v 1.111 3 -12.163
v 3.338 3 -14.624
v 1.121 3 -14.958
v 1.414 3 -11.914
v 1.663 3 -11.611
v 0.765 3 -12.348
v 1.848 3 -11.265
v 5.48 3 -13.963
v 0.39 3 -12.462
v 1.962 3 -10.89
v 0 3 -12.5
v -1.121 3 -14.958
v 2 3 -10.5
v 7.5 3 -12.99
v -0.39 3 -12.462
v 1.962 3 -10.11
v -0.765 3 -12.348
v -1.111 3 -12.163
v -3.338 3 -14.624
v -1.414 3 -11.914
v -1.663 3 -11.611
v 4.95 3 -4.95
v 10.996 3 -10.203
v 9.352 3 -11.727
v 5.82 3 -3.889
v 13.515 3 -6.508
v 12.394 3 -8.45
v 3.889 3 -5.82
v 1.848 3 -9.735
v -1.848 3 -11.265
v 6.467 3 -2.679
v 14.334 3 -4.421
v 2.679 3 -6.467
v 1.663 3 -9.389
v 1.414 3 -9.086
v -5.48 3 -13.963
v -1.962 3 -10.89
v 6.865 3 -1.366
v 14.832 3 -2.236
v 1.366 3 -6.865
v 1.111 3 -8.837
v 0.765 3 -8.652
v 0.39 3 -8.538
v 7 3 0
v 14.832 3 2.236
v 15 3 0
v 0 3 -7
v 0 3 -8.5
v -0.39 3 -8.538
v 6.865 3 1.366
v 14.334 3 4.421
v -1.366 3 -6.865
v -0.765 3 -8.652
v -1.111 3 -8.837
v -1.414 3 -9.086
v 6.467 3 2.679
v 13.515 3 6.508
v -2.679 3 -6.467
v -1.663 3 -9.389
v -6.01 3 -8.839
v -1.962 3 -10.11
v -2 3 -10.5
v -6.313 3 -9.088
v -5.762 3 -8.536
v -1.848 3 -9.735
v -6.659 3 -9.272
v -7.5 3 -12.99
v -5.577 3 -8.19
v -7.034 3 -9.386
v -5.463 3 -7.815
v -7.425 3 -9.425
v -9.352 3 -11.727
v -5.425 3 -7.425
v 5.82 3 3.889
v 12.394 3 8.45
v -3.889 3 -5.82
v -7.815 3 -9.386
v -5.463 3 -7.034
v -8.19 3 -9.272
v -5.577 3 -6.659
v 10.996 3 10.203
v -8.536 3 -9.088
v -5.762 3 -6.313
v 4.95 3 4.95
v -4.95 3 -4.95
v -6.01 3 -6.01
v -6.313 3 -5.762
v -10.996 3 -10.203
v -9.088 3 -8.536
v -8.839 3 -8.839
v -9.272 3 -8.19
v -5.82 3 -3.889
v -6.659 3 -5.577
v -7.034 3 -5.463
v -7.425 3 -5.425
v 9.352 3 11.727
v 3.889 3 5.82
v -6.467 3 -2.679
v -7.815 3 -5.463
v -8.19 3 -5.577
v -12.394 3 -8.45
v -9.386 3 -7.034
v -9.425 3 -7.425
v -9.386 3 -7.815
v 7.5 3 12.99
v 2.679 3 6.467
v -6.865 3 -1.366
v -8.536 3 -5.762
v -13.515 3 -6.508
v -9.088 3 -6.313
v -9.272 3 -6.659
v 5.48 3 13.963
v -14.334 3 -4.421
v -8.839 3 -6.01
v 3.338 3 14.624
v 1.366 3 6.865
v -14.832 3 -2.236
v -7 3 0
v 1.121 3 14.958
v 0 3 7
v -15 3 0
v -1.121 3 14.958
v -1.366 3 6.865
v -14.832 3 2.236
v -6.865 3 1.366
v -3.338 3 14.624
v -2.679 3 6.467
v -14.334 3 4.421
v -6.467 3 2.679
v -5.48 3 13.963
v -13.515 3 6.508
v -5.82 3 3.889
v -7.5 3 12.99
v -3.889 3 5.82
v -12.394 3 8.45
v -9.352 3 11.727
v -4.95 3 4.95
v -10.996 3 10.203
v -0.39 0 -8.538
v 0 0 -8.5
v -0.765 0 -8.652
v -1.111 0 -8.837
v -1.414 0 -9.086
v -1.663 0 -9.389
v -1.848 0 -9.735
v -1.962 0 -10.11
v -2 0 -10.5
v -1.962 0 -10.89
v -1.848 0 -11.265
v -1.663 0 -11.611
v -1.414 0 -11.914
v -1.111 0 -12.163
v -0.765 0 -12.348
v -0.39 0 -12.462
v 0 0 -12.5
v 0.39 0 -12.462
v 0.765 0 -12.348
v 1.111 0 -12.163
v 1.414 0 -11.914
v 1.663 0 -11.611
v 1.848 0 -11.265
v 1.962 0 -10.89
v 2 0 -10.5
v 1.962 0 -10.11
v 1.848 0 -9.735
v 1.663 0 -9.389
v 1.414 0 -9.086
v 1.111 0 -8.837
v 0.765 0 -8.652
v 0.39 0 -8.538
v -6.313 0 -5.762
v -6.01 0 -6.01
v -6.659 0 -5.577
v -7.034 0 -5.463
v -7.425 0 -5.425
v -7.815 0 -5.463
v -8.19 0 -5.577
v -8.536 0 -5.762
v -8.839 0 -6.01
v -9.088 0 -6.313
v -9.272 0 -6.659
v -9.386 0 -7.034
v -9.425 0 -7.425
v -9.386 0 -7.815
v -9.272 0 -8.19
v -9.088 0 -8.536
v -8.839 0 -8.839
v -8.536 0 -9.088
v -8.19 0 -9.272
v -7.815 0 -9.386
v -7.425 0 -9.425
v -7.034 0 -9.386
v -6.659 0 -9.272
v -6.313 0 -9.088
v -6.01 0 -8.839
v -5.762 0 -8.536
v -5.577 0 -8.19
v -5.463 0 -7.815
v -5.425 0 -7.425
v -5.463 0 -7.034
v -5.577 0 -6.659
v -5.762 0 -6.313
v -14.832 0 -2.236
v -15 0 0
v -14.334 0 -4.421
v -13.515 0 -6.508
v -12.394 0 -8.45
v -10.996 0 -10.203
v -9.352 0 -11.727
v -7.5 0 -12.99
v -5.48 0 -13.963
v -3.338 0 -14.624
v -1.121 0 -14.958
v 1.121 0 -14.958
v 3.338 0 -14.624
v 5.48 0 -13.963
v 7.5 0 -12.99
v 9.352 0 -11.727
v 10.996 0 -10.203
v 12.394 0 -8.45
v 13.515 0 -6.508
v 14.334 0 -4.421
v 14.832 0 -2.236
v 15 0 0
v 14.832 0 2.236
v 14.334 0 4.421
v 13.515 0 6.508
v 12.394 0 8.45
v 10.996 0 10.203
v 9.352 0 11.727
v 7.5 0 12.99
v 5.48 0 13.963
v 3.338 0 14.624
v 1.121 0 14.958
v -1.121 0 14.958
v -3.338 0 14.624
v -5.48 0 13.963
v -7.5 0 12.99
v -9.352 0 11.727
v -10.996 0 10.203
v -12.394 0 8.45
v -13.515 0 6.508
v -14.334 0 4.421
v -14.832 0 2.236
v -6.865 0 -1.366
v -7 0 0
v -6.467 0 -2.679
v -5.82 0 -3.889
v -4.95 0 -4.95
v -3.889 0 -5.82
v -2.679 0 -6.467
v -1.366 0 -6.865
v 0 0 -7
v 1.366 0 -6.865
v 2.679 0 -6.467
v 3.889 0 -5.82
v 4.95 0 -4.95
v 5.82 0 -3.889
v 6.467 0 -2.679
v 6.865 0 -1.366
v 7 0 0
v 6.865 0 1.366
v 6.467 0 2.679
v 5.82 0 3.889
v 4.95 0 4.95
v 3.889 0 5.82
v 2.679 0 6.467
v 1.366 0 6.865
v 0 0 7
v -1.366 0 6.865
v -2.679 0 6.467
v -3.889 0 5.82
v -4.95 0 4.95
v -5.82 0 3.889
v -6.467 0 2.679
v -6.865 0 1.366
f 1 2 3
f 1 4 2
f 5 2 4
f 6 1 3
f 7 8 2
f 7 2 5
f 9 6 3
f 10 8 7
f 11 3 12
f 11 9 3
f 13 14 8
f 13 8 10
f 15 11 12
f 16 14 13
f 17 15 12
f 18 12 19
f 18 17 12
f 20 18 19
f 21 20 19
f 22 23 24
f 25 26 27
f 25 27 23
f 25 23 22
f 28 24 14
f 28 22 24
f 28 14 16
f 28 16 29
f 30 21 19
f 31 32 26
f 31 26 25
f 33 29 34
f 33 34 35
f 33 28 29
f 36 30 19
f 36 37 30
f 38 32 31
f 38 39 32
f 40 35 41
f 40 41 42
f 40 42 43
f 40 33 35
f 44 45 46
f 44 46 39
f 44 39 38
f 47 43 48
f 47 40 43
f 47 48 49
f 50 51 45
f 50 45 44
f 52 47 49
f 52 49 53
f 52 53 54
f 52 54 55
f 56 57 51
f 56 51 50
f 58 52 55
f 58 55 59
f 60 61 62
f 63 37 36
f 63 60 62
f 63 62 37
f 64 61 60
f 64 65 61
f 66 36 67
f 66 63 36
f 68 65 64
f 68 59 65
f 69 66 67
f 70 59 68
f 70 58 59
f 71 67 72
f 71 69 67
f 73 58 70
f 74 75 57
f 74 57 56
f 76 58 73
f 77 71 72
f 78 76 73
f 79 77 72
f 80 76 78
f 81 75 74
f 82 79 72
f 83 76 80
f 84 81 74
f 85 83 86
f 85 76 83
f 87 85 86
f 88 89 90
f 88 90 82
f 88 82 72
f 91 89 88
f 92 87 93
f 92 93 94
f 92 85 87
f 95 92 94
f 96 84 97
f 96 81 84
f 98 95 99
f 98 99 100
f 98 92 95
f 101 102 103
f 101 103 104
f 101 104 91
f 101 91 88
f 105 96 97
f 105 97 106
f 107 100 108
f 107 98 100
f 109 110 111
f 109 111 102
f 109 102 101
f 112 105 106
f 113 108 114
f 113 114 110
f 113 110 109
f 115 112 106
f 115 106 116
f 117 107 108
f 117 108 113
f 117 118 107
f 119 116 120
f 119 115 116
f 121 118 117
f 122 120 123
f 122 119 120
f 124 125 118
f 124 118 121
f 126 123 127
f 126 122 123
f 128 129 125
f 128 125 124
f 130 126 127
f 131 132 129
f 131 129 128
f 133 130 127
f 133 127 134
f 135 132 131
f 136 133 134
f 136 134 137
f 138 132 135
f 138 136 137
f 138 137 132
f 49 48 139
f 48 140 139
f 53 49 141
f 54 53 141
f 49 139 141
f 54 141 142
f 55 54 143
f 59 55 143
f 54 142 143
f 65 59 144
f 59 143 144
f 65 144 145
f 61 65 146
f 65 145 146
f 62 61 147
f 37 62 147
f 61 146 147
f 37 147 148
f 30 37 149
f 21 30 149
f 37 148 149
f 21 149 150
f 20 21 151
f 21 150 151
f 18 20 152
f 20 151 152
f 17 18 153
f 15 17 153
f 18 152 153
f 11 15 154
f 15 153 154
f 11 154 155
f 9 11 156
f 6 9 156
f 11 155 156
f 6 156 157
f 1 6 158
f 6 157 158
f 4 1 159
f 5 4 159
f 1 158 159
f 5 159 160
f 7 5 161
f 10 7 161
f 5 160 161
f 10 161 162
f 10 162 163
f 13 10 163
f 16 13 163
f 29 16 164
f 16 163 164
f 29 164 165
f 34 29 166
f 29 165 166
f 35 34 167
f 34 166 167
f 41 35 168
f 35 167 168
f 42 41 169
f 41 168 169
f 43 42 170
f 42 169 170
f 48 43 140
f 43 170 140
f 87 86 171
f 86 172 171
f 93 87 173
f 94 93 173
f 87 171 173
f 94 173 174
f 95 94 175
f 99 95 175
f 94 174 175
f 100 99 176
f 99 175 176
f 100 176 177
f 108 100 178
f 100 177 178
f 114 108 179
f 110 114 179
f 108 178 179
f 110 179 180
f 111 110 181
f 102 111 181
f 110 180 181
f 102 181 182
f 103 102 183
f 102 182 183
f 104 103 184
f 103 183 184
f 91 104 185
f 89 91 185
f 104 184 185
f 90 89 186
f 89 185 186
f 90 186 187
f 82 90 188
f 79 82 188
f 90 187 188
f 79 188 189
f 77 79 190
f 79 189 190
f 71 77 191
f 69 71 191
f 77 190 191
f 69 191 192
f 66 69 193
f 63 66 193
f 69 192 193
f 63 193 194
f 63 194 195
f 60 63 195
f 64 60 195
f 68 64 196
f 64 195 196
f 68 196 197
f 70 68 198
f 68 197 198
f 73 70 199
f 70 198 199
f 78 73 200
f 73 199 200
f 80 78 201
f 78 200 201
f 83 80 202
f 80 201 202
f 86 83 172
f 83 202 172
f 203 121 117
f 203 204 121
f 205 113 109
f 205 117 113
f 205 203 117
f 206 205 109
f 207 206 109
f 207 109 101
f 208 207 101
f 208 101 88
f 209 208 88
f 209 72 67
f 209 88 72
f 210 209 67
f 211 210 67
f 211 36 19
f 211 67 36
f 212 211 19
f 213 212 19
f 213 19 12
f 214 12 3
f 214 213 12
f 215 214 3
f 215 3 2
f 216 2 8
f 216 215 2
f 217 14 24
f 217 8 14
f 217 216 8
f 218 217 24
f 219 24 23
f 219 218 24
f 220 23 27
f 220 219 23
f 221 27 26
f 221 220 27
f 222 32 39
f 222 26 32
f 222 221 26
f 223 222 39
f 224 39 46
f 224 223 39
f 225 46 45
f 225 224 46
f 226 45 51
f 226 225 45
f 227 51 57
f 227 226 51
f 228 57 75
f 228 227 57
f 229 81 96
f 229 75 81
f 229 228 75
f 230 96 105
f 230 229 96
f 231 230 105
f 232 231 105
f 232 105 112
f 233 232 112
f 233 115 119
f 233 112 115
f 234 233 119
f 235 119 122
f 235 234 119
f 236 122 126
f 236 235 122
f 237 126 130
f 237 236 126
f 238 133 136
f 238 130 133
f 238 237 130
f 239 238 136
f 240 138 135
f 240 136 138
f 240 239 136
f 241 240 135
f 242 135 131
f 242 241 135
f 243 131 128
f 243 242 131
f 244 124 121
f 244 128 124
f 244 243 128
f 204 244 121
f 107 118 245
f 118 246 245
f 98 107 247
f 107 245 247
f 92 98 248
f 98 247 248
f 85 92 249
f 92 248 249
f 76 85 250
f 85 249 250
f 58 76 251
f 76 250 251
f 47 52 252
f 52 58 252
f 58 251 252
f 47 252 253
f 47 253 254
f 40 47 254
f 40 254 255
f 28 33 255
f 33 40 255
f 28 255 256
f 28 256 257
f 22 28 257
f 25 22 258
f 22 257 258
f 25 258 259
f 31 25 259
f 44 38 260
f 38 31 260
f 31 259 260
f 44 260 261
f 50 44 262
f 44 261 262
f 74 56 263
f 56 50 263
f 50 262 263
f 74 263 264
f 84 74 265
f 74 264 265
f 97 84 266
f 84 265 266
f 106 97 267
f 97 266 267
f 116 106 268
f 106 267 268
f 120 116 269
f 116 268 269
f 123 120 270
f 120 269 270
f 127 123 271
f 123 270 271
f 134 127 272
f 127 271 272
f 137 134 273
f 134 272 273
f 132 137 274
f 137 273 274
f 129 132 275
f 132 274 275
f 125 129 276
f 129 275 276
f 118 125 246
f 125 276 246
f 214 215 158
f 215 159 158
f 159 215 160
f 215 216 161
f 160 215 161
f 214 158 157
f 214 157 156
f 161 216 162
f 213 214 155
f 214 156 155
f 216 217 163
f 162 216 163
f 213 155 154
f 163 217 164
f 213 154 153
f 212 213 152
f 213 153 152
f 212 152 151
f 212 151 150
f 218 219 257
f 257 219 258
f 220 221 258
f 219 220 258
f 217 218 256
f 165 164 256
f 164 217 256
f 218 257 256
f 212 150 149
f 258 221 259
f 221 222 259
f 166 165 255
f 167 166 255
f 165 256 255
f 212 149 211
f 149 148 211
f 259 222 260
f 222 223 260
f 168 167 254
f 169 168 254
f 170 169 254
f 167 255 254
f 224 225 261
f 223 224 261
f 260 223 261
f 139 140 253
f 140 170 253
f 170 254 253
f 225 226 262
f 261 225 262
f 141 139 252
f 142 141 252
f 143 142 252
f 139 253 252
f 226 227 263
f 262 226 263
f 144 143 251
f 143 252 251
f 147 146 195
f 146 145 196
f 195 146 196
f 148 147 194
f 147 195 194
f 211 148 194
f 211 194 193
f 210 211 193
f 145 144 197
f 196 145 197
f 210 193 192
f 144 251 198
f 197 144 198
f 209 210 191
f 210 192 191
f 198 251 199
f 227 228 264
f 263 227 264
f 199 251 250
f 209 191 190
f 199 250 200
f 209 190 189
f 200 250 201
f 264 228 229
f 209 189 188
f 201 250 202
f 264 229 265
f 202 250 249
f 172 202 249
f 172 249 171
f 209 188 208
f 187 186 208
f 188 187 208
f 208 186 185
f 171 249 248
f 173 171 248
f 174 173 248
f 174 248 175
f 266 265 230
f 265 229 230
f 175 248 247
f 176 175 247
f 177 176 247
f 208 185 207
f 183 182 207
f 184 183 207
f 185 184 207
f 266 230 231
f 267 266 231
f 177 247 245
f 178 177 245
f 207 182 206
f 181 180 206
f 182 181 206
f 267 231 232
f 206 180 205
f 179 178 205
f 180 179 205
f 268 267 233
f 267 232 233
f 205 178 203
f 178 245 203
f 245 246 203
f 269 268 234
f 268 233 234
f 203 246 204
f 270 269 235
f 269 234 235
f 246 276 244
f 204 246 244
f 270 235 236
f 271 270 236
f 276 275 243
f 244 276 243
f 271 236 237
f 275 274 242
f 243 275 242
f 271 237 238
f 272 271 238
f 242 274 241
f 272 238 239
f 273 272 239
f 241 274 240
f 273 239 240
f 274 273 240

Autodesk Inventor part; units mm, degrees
ref_plane "YZ Plane" through (0, 0, 0) normal (1, 0, 0) x (0, 1, 0)
ref_plane "XZ Plane" through (0, 0, 0) normal (0, 1, 0) x (-1, 0, 0)
ref_plane "XY Plane" through (0, 0, 0) normal (0, 0, 1) x (1, 0, 0)
sketch "Sketch1" plane through (0, 0, 0) normal (0, 1, 0) x (-1, 0, 0)
  circle A0 centre (0, 0) radius 15
  circle A1 centre (0, 0) radius 7
  dimension "d0" = 30
  dimension "d1" = 14
  dimension "d6" = 0
extrude "Extrusion1" add sketch "Sketch1" along normal blind 3
sketch "Sketch2" plane through (0, 3, 0) normal (0, 1, 0) x (1, 0, 0)
  circle A0 centre (0, 0) radius 15 projected
  line L0 (0, 0) -> (0, 10.5) construction
  circle A1 centre (0, 0) radius 10.5 construction
  line L1 (0, 0) -> (10.5, 0) construction
  dimension "d14" = 21
  dimension "d25" = 90
hole "Hole1" at (0, 3, -10.5) direction (0, -1, 0) diameter 4 end through all
pattern_circular "Circular Pattern2" count 2 over 45 about axis through (0, 0, 0) along (0, 1, 0) of "Hole1"
properties part number "OringProbe_ring_pipe_adapter_4mm_version" material "Stainless Steel, 440C"
